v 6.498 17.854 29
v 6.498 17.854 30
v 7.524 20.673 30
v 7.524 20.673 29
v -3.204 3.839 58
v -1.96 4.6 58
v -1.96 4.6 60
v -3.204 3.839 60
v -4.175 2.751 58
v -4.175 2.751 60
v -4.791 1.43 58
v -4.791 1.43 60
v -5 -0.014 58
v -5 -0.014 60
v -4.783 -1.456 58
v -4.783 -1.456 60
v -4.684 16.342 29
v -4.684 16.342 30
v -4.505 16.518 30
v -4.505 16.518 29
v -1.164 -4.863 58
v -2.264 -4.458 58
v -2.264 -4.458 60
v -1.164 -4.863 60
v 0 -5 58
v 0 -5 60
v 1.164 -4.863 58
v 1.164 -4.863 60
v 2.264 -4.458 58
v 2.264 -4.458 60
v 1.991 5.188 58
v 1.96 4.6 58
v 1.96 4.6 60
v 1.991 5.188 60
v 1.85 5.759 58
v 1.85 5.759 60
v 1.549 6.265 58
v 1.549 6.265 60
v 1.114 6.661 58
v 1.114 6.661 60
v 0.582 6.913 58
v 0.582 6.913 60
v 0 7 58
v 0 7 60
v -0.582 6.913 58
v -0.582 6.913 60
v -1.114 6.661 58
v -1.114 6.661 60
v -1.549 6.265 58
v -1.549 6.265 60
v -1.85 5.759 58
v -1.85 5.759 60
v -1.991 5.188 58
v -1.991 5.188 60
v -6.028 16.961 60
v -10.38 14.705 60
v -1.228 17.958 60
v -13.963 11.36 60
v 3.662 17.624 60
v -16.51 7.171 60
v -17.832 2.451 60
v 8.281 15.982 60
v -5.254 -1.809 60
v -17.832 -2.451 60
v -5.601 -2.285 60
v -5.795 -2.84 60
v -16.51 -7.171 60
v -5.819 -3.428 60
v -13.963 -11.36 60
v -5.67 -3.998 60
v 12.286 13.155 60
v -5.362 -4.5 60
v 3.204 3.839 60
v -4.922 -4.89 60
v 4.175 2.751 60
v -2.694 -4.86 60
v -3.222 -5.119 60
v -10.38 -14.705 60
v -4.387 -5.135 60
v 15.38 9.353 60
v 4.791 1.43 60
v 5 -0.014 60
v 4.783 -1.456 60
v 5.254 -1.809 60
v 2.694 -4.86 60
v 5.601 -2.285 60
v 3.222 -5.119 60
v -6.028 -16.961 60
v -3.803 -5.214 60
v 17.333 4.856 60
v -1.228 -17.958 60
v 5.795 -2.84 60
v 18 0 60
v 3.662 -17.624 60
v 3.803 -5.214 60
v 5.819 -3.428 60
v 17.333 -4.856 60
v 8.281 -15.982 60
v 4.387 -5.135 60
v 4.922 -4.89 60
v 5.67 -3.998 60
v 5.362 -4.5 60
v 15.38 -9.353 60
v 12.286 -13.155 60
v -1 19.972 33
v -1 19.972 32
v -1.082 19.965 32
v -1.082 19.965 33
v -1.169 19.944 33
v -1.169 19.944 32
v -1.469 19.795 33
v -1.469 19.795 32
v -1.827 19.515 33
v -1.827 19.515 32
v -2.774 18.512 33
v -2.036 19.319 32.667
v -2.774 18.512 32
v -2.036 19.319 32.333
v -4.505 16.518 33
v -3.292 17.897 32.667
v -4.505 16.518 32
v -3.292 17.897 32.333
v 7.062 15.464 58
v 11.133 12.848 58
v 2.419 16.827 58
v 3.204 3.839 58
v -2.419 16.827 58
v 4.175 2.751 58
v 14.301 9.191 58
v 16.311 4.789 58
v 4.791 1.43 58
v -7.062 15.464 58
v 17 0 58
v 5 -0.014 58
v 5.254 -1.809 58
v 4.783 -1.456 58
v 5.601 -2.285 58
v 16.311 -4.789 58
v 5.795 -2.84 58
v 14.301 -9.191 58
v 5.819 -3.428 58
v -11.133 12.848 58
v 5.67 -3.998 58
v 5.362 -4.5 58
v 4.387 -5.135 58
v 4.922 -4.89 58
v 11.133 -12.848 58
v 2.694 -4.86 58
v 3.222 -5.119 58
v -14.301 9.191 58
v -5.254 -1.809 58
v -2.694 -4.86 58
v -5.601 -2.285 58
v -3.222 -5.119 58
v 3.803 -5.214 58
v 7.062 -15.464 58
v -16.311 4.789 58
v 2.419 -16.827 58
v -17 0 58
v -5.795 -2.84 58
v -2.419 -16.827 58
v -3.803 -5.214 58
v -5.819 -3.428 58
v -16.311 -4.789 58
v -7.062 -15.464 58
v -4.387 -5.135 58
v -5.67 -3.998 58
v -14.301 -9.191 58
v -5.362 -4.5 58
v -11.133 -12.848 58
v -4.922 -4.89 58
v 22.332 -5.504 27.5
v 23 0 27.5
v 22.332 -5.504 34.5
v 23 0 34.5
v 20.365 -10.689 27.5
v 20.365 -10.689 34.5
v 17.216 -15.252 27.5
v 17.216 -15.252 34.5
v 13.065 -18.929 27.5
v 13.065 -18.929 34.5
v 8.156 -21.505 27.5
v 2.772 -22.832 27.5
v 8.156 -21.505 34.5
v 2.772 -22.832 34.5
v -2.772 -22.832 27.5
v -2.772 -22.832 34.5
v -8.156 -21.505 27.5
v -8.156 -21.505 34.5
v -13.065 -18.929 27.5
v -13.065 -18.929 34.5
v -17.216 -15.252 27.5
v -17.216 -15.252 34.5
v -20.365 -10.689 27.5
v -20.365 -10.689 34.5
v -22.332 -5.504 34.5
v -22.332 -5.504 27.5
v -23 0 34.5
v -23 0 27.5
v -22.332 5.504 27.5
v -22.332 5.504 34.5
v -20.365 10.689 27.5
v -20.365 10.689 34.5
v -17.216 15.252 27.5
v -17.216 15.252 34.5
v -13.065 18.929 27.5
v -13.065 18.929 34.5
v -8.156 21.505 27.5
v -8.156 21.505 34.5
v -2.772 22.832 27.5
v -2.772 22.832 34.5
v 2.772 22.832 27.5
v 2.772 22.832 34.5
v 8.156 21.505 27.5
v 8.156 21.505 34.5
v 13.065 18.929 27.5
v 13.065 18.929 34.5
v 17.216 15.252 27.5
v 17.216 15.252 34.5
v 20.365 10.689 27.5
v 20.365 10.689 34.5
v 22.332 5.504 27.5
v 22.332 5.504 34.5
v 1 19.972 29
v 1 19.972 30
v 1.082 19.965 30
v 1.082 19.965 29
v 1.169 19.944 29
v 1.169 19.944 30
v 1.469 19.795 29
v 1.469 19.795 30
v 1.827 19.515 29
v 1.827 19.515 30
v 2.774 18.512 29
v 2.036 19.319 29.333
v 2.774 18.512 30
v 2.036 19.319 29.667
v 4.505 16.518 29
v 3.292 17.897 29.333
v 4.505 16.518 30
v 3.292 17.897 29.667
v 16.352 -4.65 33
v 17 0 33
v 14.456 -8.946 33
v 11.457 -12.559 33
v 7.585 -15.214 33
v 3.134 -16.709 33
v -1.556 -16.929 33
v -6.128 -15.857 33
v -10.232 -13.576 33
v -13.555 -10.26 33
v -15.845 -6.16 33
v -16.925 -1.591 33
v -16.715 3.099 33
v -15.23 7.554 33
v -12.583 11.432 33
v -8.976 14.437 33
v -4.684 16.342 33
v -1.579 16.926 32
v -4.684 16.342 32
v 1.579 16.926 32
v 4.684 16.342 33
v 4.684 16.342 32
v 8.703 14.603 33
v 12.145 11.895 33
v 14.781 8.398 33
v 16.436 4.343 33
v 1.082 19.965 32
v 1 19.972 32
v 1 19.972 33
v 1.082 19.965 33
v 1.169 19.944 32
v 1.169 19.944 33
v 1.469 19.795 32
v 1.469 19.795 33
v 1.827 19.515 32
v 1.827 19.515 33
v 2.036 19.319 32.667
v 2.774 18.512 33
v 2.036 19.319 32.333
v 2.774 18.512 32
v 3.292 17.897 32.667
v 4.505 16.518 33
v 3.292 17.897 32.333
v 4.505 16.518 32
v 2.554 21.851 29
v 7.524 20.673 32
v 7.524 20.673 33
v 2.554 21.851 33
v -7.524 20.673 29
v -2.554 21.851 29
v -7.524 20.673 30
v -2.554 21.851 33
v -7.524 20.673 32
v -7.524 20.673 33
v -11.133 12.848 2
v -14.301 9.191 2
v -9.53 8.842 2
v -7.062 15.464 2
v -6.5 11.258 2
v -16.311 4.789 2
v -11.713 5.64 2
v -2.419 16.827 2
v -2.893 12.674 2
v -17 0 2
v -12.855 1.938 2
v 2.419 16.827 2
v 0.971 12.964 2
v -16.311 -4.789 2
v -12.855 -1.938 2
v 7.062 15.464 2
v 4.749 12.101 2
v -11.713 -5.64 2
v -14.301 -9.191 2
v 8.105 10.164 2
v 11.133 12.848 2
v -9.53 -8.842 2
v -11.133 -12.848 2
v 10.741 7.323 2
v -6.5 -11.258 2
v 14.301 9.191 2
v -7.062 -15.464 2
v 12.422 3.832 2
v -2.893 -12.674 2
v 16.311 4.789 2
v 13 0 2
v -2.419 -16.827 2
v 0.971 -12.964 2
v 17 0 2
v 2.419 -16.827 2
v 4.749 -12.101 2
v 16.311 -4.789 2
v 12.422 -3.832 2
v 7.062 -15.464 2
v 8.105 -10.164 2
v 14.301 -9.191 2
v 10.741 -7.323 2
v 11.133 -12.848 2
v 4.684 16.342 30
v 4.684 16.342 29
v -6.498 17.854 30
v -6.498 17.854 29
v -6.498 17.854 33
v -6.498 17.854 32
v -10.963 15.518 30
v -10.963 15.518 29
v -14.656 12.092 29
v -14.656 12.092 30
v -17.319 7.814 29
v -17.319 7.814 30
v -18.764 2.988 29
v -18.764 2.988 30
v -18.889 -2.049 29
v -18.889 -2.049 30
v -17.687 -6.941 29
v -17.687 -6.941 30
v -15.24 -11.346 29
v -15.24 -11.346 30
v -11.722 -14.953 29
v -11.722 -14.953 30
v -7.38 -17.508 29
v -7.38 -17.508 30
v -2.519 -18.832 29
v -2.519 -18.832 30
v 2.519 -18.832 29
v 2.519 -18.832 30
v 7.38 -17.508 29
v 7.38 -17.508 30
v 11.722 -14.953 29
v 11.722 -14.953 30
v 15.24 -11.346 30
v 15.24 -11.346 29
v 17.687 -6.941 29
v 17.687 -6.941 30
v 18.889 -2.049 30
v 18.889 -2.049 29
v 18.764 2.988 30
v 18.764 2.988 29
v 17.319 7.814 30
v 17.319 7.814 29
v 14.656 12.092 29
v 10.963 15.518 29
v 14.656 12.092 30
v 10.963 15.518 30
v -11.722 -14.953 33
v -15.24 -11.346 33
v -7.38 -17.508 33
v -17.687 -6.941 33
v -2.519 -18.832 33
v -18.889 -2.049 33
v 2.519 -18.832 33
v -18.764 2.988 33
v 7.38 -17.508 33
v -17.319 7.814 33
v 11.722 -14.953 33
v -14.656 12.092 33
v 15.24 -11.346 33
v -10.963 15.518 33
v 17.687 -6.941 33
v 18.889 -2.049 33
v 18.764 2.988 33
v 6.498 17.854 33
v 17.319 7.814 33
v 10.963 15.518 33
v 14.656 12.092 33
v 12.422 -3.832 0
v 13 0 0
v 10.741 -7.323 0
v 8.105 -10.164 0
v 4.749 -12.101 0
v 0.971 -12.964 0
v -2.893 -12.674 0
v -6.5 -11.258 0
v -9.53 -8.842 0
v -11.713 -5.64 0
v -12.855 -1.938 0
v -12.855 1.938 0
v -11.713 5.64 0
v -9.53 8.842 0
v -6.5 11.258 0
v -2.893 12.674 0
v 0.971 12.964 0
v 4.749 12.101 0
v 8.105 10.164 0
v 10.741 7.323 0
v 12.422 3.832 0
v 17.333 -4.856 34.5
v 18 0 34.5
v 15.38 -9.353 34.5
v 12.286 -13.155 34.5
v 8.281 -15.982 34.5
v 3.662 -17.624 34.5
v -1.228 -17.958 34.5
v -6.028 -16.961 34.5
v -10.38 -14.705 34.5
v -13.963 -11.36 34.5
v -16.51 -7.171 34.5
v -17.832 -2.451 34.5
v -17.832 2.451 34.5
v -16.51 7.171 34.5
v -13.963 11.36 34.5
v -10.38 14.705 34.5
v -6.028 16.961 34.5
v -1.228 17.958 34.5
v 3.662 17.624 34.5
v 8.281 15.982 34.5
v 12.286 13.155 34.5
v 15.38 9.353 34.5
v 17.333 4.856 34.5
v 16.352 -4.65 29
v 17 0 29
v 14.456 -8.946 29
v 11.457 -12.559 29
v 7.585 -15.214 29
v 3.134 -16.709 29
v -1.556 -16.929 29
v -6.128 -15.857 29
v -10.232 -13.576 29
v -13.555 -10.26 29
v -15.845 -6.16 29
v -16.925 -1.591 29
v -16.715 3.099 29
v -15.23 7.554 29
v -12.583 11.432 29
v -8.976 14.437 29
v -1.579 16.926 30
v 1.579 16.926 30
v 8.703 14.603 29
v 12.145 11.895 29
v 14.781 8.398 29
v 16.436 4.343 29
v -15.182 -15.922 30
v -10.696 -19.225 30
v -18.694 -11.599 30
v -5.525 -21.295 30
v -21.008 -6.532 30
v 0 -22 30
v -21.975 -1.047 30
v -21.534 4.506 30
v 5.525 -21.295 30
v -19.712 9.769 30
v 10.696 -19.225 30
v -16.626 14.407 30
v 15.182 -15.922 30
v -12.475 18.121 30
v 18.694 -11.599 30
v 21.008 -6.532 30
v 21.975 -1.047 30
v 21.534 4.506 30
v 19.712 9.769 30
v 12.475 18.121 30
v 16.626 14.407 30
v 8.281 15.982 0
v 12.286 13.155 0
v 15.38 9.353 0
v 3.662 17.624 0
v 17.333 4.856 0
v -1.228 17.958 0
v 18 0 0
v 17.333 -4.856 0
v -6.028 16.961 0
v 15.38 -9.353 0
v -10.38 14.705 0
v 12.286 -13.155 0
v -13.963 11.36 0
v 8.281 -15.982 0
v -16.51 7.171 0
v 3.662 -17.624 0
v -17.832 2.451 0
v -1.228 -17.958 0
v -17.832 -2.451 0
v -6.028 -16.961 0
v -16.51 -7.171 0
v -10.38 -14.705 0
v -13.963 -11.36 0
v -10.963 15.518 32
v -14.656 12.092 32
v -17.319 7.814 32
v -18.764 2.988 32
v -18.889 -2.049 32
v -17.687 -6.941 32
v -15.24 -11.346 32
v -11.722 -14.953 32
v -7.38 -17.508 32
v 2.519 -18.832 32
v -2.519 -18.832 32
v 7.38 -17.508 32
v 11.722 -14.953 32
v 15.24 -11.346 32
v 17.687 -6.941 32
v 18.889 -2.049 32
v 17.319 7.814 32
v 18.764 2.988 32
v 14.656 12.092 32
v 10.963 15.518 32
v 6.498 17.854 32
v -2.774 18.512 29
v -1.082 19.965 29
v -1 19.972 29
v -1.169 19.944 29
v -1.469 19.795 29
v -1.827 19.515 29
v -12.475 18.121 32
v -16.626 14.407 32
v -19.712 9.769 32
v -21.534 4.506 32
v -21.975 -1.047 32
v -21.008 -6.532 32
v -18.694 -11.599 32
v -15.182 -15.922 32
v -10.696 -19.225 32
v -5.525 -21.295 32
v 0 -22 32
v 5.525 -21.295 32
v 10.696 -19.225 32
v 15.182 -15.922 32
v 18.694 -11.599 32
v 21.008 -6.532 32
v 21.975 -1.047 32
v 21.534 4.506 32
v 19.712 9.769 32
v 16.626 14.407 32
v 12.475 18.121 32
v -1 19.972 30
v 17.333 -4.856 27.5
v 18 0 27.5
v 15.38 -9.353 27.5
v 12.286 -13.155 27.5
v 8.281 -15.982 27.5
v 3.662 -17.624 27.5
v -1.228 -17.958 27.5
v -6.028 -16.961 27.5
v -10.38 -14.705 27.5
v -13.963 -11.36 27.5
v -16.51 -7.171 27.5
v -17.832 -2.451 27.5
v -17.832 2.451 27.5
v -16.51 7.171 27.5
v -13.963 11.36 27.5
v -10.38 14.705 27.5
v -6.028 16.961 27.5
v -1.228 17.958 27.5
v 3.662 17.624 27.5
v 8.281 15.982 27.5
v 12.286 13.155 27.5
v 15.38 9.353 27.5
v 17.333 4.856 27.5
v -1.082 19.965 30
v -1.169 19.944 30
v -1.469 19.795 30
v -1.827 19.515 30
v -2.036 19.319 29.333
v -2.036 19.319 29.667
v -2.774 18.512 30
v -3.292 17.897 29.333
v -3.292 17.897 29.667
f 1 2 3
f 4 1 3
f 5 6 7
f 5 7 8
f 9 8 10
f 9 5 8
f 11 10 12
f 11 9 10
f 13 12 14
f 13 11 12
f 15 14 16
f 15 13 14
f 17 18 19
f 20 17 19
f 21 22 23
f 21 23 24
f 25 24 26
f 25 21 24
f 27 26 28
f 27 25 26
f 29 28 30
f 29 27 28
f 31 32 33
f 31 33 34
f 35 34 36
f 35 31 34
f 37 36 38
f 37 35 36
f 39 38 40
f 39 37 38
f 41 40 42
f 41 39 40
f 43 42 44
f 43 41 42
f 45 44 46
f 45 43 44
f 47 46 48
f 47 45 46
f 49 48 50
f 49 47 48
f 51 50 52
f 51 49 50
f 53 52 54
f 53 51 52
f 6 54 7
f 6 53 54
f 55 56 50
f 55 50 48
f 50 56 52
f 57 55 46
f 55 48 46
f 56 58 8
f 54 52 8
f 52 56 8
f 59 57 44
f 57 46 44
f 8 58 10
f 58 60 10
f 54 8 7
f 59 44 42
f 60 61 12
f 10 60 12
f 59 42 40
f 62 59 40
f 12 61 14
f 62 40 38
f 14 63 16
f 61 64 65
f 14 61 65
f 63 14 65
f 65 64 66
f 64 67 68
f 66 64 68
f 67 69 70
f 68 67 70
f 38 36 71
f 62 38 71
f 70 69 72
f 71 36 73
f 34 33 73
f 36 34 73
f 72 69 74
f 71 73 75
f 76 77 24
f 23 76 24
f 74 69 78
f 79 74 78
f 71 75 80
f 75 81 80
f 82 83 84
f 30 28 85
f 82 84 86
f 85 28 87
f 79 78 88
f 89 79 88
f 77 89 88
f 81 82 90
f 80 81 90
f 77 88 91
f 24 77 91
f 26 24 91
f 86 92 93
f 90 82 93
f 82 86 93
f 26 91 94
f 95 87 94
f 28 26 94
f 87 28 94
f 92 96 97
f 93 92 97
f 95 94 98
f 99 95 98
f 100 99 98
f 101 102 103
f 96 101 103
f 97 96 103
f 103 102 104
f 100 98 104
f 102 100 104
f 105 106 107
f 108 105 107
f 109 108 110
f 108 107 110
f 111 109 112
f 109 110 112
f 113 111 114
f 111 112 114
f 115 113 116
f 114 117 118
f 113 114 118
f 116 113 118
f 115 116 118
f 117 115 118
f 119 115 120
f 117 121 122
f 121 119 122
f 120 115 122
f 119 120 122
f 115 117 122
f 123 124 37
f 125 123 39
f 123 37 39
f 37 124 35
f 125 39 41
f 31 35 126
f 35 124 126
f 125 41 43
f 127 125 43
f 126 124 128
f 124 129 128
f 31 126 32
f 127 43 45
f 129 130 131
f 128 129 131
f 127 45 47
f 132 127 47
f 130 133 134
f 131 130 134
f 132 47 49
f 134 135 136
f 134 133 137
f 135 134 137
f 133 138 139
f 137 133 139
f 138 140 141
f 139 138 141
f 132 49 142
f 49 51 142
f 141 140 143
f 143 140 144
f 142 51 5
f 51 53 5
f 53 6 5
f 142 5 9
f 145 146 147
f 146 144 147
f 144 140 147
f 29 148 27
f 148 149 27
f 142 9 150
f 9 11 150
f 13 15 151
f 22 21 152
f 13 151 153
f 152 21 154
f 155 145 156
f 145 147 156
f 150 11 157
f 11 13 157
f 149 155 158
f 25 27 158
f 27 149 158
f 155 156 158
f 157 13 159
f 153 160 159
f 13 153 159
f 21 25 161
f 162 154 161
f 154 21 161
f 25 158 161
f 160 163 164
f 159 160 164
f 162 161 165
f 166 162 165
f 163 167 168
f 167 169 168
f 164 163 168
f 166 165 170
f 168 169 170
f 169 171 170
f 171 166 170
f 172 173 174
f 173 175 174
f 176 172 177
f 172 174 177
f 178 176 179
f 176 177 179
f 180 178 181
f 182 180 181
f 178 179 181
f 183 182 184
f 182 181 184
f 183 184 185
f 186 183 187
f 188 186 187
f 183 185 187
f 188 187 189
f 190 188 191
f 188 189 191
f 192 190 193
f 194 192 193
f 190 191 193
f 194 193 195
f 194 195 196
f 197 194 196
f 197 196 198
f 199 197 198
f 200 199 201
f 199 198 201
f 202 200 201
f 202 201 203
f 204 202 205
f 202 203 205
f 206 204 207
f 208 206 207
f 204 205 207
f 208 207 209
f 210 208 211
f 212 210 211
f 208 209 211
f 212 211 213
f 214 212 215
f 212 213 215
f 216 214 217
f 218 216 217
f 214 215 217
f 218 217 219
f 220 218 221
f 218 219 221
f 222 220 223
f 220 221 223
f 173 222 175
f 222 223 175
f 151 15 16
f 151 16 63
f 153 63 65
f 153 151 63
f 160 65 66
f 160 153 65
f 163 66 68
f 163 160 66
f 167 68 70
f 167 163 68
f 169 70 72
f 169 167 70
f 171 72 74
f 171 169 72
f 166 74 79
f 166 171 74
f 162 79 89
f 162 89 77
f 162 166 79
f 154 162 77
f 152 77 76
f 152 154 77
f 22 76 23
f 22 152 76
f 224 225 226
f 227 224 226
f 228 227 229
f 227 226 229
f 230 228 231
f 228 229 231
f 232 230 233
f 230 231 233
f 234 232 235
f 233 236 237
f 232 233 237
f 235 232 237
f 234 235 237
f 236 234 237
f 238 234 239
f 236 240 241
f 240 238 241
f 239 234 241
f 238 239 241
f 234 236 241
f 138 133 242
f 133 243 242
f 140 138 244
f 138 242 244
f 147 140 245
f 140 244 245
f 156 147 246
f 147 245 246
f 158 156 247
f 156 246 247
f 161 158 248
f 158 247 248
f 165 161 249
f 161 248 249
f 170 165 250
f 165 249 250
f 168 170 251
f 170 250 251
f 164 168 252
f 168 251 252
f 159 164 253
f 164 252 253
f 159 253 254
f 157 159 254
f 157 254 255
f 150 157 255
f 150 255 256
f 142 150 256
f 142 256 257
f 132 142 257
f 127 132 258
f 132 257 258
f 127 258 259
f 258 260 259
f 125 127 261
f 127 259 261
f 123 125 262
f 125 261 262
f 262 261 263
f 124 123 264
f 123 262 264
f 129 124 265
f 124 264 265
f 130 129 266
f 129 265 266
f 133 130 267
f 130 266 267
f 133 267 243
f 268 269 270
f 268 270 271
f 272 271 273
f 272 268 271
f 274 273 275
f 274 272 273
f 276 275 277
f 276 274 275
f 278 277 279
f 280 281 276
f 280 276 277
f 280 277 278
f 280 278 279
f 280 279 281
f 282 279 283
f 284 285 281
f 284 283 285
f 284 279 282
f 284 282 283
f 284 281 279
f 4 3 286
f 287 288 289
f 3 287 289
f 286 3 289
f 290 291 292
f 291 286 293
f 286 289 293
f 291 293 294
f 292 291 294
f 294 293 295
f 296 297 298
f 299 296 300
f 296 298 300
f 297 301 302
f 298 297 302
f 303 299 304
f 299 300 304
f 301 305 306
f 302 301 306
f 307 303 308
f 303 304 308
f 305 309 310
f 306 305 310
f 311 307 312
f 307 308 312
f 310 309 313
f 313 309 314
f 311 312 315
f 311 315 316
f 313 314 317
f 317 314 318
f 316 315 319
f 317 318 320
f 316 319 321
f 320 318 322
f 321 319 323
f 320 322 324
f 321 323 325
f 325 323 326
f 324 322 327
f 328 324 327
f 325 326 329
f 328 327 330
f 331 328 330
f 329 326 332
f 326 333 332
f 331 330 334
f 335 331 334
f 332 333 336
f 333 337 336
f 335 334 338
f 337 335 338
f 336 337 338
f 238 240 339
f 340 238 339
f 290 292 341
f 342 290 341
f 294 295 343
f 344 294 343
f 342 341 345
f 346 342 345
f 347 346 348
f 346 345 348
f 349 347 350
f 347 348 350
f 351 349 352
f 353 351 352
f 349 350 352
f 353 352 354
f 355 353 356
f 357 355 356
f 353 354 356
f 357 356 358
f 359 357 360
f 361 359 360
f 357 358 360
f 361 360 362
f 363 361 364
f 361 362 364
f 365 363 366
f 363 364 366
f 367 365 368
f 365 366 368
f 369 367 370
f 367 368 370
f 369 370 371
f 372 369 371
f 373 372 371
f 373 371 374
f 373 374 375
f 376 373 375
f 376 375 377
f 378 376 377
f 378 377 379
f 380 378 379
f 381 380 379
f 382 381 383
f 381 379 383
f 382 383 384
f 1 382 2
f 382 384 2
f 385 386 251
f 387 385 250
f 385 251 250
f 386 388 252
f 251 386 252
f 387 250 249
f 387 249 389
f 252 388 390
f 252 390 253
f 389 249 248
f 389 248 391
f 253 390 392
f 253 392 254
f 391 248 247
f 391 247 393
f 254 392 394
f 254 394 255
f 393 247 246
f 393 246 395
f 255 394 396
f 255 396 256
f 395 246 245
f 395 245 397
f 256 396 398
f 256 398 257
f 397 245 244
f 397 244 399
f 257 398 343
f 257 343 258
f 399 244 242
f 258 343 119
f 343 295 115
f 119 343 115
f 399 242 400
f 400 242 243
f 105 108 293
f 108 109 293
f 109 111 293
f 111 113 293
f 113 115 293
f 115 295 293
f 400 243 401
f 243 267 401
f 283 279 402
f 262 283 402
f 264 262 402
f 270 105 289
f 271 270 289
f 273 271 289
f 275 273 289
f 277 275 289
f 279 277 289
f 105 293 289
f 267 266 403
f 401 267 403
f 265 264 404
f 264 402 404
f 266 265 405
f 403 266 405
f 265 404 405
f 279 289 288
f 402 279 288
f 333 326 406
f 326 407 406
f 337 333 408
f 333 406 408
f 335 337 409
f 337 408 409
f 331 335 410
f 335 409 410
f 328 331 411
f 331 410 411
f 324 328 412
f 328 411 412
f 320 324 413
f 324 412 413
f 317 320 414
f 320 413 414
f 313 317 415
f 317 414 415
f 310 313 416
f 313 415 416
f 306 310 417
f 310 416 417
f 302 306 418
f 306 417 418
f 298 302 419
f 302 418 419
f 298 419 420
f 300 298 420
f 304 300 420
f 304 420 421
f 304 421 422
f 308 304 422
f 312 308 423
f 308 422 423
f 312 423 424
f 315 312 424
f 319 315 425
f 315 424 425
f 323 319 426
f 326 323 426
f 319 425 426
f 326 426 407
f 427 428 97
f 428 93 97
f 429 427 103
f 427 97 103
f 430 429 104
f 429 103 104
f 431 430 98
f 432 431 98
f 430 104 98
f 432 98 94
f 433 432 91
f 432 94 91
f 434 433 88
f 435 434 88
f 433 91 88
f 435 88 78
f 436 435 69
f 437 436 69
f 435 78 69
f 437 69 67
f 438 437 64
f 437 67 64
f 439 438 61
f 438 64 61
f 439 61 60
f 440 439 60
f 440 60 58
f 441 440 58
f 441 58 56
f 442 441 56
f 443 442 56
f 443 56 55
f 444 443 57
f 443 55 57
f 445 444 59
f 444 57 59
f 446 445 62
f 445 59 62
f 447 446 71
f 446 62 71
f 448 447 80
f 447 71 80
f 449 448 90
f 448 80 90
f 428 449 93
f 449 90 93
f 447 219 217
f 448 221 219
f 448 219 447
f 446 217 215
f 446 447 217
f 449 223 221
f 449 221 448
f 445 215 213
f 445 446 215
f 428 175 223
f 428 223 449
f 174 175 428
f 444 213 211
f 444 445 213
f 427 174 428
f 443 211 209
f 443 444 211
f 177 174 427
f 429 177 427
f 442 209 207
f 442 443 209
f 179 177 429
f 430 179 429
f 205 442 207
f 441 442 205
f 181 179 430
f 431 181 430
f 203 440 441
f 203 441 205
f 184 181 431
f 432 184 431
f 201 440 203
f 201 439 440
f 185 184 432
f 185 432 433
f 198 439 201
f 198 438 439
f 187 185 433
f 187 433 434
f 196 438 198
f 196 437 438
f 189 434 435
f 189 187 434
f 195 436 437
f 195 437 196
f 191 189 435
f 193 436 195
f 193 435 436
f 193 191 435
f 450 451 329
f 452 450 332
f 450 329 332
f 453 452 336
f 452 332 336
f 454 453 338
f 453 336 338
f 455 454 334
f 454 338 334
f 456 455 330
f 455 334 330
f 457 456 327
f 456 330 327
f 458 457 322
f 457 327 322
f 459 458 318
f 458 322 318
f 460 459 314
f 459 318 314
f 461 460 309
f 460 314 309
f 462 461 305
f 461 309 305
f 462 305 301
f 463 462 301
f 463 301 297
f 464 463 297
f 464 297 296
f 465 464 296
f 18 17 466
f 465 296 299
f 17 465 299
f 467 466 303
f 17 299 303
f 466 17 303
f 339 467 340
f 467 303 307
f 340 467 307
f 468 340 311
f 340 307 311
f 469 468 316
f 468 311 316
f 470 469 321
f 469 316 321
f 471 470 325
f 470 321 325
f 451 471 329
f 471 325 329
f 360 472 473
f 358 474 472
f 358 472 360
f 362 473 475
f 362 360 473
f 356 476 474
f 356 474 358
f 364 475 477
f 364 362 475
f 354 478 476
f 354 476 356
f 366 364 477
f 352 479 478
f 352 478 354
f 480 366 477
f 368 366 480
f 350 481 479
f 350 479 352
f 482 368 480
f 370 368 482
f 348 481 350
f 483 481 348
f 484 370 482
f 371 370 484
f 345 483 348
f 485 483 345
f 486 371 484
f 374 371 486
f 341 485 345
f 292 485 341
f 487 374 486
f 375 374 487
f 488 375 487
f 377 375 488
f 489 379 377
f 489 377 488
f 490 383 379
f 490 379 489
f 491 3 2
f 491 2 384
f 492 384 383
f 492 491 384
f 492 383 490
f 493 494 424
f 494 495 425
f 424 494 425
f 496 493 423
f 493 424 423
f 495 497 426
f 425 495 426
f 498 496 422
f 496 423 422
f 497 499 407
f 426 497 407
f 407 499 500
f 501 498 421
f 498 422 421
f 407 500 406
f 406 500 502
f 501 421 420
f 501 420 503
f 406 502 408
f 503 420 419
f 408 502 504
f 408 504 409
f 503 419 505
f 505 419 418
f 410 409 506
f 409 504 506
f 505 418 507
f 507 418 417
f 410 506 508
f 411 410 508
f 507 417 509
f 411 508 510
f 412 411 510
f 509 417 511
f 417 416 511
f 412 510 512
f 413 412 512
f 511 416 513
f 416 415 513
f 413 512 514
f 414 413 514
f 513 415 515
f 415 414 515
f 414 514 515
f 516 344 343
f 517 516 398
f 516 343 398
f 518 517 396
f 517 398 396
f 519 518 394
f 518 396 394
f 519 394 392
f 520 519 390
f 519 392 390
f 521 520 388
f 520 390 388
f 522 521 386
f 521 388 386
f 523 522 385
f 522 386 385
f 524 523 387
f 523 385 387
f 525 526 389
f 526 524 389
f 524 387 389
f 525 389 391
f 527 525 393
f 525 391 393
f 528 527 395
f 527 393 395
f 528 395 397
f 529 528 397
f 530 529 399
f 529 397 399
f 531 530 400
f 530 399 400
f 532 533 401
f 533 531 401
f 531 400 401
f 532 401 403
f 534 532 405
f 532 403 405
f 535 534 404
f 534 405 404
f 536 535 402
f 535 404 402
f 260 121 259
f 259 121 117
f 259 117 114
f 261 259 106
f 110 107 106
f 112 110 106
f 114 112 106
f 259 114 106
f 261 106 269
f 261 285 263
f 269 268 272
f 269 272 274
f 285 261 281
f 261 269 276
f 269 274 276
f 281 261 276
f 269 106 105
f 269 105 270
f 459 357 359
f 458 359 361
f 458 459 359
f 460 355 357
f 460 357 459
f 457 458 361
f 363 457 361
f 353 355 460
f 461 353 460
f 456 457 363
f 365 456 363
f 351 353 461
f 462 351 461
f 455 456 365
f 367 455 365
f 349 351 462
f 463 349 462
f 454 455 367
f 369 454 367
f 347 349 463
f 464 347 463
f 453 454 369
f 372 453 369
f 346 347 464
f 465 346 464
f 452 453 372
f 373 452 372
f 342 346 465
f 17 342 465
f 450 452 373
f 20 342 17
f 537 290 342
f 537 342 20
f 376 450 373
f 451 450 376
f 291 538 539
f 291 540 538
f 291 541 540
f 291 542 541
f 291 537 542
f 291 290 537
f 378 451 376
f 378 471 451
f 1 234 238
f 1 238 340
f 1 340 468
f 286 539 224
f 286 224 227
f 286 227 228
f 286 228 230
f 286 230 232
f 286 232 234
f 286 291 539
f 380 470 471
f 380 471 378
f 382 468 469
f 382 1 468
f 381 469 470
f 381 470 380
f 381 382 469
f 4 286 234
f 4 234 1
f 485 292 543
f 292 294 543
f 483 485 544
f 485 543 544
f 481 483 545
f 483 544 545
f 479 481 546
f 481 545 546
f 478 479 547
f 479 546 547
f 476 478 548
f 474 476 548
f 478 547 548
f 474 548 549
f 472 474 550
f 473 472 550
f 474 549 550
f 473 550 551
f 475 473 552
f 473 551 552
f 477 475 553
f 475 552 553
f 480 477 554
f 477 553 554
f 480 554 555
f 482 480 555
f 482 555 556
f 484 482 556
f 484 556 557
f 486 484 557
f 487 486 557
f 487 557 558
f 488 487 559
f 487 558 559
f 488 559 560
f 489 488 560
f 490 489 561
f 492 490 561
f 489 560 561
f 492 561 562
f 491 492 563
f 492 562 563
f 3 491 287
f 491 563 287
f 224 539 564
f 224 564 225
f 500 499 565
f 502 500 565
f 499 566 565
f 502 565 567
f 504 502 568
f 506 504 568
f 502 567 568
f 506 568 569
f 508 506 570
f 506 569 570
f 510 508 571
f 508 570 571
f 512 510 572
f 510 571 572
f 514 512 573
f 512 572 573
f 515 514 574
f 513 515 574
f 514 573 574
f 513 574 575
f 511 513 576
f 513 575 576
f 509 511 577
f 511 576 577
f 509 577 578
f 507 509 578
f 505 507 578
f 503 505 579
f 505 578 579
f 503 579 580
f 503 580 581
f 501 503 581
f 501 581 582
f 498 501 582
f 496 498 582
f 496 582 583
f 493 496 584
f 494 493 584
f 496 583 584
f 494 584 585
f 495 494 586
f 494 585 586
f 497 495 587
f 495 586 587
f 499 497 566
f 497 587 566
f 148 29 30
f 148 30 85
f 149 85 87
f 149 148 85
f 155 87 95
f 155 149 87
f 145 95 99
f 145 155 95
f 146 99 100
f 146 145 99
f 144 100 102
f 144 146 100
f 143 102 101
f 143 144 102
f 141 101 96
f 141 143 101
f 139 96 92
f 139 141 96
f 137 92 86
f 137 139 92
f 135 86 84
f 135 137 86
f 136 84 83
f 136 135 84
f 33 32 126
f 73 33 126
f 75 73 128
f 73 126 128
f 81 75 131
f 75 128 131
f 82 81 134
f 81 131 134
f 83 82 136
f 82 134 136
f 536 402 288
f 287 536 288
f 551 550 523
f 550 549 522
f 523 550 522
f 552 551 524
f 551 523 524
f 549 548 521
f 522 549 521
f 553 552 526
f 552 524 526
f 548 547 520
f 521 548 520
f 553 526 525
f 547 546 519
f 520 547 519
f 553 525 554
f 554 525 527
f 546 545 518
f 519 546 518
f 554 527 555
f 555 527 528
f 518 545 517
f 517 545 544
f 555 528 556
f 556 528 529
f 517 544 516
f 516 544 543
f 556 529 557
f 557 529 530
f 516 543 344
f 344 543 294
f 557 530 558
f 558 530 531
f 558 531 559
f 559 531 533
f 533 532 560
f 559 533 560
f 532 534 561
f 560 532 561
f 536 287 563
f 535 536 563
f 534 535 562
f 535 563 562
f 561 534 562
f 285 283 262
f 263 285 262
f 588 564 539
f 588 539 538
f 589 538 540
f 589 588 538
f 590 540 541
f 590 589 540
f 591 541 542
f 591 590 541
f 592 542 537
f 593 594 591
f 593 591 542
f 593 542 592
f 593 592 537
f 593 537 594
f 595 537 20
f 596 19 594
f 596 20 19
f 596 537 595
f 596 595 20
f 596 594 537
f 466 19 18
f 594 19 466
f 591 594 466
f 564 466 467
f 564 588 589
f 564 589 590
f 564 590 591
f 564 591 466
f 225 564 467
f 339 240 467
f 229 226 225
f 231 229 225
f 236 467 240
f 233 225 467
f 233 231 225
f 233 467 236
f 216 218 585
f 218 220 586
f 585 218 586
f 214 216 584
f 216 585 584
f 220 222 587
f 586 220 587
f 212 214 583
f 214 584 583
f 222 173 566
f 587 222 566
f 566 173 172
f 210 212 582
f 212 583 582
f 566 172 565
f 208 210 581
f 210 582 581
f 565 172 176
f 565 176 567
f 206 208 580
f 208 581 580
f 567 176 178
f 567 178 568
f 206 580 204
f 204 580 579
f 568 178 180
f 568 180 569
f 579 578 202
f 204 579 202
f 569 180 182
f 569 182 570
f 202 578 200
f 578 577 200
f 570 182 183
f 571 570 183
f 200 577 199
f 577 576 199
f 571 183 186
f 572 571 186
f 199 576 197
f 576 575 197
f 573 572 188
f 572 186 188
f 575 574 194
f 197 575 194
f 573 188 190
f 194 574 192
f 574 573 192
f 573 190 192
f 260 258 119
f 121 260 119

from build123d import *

# Parameters (mm, degrees)
SKETCH1_W          = 3.5
SKETCH1_H          = 5
CUT_EXTRUDE1_DEPTH = 2
SKETCH3_5_R        = 17
CUT_EXTRUDE2_DEPTH = 1
CUT_EXTRUDE3_START = -2
SKETCH5_R          = 5
SKETCH5_R_2        = 2
CUT_EXTRUDE3_DEPTH = 2


with BuildPart() as part:
    # Sketch1 → Revolve1 (revolve)
    with BuildSketch(Plane(origin=(0, 0, 0), x_dir=(0, 0, -1), z_dir=(1, 0, 0)), mode=Mode.PRIVATE) as revolve1_sk:
        Polygon((-60, 18), (-60, 5), (-58, 5), (-58, 17), (-31, 17), (-31, 18), (-34.5, 18), align=None)
        with Locations((-32.75, 20.5)):
            Rectangle(SKETCH1_W, SKETCH1_H)
        with Locations((-29.25, 20.5)):
            Rectangle(SKETCH1_W, SKETCH1_H)
        Polygon((-31, 18), (-31, 17), (-2, 17), (-2, 13), (0, 13), (0, 18), (-27.5, 18), align=None)
    revolve(revolve1_sk.sketch.rotate(Axis((0, 0, 1072.381477522), (0, 0, -1)), 90), axis=Axis((0, 0, 1072.381477522), (0, 0, -1)))

    # Sketch3 → Cut-Extrude1 (cut, symmetric)
    with BuildSketch(Plane.XY.offset(31)):
        with BuildLine():
            ThreePointArc((-6.498382723, 17.854159795), (0, -19), (6.498382723, 17.854159795))
            Line((6.498382723, 17.854159795), (7.524443153, 20.673237657))
            ThreePointArc((7.524443153, 20.673237657), (0, 22), (-7.524443153, 20.673237657))
            Line((-7.524443153, 20.673237657), (-6.498382723, 17.854159795))
        make_face()
        with BuildLine():
            add(Edge.make_bspline(
                [(-1, 19.972475891), (-1.837517439, 19.972475891), (-3.400702548, 17.606617047), (-4.505243001, 16.51810785)],
                knots=[0, 0, 0, 0, 1, 1, 1, 1], degree=3))
            Line((-1, 19.972475891), (1, 19.972475891))
            add(Edge.make_bspline(
                [(1, 19.972475891), (1.837517439, 19.972475891), (3.400702548, 17.606617047), (4.505243001, 16.51810785)],
                knots=[0, 0, 0, 0, 1, 1, 1, 1], degree=3))
            Line((4.505243001, 16.51810785), (4.683957663, 16.341987046))
            ThreePointArc((4.683957663, 16.341987046), (13.576215973, 10.231635249), (17, 0))
            ThreePointArc((17, 0), (-10.231635249, -13.576215973), (-4.683957663, 16.341987046))
            Line((-4.683957663, 16.341987046), (-4.505243001, 16.51810785))
        make_face(mode=Mode.SUBTRACT)
    extrude(amount=CUT_EXTRUDE1_DEPTH, both=True, mode=Mode.SUBTRACT)

    # Sketch3<5> → Cut-Extrude2 (cut, symmetric)
    with BuildSketch(Plane.XY.offset(31)):
        Circle(SKETCH3_5_R)
        with BuildLine():
            Line((1, 19.972475891), (-1, 19.972475891))
            add(Edge.make_bspline(
                [(-1, 19.972475891), (-1.837517439, 19.972475891), (-3.400702548, 17.606617047), (-4.505243001, 16.51810785)],
                knots=[0, 0, 0, 0, 1, 1, 1, 1], degree=3))
            Line((-4.505243001, 16.51810785), (-4.683957663, 16.341987046))
            ThreePointArc((-4.683957663, 16.341987046), (0, 17), (4.683957663, 16.341987046))
            Line((4.683957663, 16.341987046), (4.505243001, 16.51810785))
            add(Edge.make_bspline(
                [(1, 19.972475891), (1.837517439, 19.972475891), (3.400702548, 17.606617047), (4.505243001, 16.51810785)],
                knots=[0, 0, 0, 0, 1, 1, 1, 1], degree=3))
        make_face()
        with BuildLine():
            Line((7.524443153, 20.673237657), (6.498382723, 17.854159795))
            ThreePointArc((6.498382723, 17.854159795), (0, -19), (-6.498382723, 17.854159795))
            Line((-6.498382723, 17.854159795), (-7.524443153, 20.673237657))
            ThreePointArc((-7.524443153, 20.673237657), (-12.6186816, -18.021344974), (22, 0))
            ThreePointArc((22, 0), (18.021344974, 12.6186816), (7.524443153, 20.673237657))
        make_face()
    extrude(amount=CUT_EXTRUDE2_DEPTH, both=True, mode=Mode.SUBTRACT)

    # Sketch5 → Cut-Extrude3 (cut)
    with BuildSketch(Plane.XY.offset(60).offset(CUT_EXTRUDE3_START)):
        Circle(SKETCH5_R)
        with Locations((-3.830222216, -3.213938048)):
            Circle(SKETCH5_R_2)
        with Locations((0, 5)):
            Circle(SKETCH5_R_2)
        with Locations((3.830222216, -3.213938048)):
            Circle(SKETCH5_R_2)
    extrude(amount=CUT_EXTRUDE3_DEPTH, mode=Mode.SUBTRACT)


solid = part.part
